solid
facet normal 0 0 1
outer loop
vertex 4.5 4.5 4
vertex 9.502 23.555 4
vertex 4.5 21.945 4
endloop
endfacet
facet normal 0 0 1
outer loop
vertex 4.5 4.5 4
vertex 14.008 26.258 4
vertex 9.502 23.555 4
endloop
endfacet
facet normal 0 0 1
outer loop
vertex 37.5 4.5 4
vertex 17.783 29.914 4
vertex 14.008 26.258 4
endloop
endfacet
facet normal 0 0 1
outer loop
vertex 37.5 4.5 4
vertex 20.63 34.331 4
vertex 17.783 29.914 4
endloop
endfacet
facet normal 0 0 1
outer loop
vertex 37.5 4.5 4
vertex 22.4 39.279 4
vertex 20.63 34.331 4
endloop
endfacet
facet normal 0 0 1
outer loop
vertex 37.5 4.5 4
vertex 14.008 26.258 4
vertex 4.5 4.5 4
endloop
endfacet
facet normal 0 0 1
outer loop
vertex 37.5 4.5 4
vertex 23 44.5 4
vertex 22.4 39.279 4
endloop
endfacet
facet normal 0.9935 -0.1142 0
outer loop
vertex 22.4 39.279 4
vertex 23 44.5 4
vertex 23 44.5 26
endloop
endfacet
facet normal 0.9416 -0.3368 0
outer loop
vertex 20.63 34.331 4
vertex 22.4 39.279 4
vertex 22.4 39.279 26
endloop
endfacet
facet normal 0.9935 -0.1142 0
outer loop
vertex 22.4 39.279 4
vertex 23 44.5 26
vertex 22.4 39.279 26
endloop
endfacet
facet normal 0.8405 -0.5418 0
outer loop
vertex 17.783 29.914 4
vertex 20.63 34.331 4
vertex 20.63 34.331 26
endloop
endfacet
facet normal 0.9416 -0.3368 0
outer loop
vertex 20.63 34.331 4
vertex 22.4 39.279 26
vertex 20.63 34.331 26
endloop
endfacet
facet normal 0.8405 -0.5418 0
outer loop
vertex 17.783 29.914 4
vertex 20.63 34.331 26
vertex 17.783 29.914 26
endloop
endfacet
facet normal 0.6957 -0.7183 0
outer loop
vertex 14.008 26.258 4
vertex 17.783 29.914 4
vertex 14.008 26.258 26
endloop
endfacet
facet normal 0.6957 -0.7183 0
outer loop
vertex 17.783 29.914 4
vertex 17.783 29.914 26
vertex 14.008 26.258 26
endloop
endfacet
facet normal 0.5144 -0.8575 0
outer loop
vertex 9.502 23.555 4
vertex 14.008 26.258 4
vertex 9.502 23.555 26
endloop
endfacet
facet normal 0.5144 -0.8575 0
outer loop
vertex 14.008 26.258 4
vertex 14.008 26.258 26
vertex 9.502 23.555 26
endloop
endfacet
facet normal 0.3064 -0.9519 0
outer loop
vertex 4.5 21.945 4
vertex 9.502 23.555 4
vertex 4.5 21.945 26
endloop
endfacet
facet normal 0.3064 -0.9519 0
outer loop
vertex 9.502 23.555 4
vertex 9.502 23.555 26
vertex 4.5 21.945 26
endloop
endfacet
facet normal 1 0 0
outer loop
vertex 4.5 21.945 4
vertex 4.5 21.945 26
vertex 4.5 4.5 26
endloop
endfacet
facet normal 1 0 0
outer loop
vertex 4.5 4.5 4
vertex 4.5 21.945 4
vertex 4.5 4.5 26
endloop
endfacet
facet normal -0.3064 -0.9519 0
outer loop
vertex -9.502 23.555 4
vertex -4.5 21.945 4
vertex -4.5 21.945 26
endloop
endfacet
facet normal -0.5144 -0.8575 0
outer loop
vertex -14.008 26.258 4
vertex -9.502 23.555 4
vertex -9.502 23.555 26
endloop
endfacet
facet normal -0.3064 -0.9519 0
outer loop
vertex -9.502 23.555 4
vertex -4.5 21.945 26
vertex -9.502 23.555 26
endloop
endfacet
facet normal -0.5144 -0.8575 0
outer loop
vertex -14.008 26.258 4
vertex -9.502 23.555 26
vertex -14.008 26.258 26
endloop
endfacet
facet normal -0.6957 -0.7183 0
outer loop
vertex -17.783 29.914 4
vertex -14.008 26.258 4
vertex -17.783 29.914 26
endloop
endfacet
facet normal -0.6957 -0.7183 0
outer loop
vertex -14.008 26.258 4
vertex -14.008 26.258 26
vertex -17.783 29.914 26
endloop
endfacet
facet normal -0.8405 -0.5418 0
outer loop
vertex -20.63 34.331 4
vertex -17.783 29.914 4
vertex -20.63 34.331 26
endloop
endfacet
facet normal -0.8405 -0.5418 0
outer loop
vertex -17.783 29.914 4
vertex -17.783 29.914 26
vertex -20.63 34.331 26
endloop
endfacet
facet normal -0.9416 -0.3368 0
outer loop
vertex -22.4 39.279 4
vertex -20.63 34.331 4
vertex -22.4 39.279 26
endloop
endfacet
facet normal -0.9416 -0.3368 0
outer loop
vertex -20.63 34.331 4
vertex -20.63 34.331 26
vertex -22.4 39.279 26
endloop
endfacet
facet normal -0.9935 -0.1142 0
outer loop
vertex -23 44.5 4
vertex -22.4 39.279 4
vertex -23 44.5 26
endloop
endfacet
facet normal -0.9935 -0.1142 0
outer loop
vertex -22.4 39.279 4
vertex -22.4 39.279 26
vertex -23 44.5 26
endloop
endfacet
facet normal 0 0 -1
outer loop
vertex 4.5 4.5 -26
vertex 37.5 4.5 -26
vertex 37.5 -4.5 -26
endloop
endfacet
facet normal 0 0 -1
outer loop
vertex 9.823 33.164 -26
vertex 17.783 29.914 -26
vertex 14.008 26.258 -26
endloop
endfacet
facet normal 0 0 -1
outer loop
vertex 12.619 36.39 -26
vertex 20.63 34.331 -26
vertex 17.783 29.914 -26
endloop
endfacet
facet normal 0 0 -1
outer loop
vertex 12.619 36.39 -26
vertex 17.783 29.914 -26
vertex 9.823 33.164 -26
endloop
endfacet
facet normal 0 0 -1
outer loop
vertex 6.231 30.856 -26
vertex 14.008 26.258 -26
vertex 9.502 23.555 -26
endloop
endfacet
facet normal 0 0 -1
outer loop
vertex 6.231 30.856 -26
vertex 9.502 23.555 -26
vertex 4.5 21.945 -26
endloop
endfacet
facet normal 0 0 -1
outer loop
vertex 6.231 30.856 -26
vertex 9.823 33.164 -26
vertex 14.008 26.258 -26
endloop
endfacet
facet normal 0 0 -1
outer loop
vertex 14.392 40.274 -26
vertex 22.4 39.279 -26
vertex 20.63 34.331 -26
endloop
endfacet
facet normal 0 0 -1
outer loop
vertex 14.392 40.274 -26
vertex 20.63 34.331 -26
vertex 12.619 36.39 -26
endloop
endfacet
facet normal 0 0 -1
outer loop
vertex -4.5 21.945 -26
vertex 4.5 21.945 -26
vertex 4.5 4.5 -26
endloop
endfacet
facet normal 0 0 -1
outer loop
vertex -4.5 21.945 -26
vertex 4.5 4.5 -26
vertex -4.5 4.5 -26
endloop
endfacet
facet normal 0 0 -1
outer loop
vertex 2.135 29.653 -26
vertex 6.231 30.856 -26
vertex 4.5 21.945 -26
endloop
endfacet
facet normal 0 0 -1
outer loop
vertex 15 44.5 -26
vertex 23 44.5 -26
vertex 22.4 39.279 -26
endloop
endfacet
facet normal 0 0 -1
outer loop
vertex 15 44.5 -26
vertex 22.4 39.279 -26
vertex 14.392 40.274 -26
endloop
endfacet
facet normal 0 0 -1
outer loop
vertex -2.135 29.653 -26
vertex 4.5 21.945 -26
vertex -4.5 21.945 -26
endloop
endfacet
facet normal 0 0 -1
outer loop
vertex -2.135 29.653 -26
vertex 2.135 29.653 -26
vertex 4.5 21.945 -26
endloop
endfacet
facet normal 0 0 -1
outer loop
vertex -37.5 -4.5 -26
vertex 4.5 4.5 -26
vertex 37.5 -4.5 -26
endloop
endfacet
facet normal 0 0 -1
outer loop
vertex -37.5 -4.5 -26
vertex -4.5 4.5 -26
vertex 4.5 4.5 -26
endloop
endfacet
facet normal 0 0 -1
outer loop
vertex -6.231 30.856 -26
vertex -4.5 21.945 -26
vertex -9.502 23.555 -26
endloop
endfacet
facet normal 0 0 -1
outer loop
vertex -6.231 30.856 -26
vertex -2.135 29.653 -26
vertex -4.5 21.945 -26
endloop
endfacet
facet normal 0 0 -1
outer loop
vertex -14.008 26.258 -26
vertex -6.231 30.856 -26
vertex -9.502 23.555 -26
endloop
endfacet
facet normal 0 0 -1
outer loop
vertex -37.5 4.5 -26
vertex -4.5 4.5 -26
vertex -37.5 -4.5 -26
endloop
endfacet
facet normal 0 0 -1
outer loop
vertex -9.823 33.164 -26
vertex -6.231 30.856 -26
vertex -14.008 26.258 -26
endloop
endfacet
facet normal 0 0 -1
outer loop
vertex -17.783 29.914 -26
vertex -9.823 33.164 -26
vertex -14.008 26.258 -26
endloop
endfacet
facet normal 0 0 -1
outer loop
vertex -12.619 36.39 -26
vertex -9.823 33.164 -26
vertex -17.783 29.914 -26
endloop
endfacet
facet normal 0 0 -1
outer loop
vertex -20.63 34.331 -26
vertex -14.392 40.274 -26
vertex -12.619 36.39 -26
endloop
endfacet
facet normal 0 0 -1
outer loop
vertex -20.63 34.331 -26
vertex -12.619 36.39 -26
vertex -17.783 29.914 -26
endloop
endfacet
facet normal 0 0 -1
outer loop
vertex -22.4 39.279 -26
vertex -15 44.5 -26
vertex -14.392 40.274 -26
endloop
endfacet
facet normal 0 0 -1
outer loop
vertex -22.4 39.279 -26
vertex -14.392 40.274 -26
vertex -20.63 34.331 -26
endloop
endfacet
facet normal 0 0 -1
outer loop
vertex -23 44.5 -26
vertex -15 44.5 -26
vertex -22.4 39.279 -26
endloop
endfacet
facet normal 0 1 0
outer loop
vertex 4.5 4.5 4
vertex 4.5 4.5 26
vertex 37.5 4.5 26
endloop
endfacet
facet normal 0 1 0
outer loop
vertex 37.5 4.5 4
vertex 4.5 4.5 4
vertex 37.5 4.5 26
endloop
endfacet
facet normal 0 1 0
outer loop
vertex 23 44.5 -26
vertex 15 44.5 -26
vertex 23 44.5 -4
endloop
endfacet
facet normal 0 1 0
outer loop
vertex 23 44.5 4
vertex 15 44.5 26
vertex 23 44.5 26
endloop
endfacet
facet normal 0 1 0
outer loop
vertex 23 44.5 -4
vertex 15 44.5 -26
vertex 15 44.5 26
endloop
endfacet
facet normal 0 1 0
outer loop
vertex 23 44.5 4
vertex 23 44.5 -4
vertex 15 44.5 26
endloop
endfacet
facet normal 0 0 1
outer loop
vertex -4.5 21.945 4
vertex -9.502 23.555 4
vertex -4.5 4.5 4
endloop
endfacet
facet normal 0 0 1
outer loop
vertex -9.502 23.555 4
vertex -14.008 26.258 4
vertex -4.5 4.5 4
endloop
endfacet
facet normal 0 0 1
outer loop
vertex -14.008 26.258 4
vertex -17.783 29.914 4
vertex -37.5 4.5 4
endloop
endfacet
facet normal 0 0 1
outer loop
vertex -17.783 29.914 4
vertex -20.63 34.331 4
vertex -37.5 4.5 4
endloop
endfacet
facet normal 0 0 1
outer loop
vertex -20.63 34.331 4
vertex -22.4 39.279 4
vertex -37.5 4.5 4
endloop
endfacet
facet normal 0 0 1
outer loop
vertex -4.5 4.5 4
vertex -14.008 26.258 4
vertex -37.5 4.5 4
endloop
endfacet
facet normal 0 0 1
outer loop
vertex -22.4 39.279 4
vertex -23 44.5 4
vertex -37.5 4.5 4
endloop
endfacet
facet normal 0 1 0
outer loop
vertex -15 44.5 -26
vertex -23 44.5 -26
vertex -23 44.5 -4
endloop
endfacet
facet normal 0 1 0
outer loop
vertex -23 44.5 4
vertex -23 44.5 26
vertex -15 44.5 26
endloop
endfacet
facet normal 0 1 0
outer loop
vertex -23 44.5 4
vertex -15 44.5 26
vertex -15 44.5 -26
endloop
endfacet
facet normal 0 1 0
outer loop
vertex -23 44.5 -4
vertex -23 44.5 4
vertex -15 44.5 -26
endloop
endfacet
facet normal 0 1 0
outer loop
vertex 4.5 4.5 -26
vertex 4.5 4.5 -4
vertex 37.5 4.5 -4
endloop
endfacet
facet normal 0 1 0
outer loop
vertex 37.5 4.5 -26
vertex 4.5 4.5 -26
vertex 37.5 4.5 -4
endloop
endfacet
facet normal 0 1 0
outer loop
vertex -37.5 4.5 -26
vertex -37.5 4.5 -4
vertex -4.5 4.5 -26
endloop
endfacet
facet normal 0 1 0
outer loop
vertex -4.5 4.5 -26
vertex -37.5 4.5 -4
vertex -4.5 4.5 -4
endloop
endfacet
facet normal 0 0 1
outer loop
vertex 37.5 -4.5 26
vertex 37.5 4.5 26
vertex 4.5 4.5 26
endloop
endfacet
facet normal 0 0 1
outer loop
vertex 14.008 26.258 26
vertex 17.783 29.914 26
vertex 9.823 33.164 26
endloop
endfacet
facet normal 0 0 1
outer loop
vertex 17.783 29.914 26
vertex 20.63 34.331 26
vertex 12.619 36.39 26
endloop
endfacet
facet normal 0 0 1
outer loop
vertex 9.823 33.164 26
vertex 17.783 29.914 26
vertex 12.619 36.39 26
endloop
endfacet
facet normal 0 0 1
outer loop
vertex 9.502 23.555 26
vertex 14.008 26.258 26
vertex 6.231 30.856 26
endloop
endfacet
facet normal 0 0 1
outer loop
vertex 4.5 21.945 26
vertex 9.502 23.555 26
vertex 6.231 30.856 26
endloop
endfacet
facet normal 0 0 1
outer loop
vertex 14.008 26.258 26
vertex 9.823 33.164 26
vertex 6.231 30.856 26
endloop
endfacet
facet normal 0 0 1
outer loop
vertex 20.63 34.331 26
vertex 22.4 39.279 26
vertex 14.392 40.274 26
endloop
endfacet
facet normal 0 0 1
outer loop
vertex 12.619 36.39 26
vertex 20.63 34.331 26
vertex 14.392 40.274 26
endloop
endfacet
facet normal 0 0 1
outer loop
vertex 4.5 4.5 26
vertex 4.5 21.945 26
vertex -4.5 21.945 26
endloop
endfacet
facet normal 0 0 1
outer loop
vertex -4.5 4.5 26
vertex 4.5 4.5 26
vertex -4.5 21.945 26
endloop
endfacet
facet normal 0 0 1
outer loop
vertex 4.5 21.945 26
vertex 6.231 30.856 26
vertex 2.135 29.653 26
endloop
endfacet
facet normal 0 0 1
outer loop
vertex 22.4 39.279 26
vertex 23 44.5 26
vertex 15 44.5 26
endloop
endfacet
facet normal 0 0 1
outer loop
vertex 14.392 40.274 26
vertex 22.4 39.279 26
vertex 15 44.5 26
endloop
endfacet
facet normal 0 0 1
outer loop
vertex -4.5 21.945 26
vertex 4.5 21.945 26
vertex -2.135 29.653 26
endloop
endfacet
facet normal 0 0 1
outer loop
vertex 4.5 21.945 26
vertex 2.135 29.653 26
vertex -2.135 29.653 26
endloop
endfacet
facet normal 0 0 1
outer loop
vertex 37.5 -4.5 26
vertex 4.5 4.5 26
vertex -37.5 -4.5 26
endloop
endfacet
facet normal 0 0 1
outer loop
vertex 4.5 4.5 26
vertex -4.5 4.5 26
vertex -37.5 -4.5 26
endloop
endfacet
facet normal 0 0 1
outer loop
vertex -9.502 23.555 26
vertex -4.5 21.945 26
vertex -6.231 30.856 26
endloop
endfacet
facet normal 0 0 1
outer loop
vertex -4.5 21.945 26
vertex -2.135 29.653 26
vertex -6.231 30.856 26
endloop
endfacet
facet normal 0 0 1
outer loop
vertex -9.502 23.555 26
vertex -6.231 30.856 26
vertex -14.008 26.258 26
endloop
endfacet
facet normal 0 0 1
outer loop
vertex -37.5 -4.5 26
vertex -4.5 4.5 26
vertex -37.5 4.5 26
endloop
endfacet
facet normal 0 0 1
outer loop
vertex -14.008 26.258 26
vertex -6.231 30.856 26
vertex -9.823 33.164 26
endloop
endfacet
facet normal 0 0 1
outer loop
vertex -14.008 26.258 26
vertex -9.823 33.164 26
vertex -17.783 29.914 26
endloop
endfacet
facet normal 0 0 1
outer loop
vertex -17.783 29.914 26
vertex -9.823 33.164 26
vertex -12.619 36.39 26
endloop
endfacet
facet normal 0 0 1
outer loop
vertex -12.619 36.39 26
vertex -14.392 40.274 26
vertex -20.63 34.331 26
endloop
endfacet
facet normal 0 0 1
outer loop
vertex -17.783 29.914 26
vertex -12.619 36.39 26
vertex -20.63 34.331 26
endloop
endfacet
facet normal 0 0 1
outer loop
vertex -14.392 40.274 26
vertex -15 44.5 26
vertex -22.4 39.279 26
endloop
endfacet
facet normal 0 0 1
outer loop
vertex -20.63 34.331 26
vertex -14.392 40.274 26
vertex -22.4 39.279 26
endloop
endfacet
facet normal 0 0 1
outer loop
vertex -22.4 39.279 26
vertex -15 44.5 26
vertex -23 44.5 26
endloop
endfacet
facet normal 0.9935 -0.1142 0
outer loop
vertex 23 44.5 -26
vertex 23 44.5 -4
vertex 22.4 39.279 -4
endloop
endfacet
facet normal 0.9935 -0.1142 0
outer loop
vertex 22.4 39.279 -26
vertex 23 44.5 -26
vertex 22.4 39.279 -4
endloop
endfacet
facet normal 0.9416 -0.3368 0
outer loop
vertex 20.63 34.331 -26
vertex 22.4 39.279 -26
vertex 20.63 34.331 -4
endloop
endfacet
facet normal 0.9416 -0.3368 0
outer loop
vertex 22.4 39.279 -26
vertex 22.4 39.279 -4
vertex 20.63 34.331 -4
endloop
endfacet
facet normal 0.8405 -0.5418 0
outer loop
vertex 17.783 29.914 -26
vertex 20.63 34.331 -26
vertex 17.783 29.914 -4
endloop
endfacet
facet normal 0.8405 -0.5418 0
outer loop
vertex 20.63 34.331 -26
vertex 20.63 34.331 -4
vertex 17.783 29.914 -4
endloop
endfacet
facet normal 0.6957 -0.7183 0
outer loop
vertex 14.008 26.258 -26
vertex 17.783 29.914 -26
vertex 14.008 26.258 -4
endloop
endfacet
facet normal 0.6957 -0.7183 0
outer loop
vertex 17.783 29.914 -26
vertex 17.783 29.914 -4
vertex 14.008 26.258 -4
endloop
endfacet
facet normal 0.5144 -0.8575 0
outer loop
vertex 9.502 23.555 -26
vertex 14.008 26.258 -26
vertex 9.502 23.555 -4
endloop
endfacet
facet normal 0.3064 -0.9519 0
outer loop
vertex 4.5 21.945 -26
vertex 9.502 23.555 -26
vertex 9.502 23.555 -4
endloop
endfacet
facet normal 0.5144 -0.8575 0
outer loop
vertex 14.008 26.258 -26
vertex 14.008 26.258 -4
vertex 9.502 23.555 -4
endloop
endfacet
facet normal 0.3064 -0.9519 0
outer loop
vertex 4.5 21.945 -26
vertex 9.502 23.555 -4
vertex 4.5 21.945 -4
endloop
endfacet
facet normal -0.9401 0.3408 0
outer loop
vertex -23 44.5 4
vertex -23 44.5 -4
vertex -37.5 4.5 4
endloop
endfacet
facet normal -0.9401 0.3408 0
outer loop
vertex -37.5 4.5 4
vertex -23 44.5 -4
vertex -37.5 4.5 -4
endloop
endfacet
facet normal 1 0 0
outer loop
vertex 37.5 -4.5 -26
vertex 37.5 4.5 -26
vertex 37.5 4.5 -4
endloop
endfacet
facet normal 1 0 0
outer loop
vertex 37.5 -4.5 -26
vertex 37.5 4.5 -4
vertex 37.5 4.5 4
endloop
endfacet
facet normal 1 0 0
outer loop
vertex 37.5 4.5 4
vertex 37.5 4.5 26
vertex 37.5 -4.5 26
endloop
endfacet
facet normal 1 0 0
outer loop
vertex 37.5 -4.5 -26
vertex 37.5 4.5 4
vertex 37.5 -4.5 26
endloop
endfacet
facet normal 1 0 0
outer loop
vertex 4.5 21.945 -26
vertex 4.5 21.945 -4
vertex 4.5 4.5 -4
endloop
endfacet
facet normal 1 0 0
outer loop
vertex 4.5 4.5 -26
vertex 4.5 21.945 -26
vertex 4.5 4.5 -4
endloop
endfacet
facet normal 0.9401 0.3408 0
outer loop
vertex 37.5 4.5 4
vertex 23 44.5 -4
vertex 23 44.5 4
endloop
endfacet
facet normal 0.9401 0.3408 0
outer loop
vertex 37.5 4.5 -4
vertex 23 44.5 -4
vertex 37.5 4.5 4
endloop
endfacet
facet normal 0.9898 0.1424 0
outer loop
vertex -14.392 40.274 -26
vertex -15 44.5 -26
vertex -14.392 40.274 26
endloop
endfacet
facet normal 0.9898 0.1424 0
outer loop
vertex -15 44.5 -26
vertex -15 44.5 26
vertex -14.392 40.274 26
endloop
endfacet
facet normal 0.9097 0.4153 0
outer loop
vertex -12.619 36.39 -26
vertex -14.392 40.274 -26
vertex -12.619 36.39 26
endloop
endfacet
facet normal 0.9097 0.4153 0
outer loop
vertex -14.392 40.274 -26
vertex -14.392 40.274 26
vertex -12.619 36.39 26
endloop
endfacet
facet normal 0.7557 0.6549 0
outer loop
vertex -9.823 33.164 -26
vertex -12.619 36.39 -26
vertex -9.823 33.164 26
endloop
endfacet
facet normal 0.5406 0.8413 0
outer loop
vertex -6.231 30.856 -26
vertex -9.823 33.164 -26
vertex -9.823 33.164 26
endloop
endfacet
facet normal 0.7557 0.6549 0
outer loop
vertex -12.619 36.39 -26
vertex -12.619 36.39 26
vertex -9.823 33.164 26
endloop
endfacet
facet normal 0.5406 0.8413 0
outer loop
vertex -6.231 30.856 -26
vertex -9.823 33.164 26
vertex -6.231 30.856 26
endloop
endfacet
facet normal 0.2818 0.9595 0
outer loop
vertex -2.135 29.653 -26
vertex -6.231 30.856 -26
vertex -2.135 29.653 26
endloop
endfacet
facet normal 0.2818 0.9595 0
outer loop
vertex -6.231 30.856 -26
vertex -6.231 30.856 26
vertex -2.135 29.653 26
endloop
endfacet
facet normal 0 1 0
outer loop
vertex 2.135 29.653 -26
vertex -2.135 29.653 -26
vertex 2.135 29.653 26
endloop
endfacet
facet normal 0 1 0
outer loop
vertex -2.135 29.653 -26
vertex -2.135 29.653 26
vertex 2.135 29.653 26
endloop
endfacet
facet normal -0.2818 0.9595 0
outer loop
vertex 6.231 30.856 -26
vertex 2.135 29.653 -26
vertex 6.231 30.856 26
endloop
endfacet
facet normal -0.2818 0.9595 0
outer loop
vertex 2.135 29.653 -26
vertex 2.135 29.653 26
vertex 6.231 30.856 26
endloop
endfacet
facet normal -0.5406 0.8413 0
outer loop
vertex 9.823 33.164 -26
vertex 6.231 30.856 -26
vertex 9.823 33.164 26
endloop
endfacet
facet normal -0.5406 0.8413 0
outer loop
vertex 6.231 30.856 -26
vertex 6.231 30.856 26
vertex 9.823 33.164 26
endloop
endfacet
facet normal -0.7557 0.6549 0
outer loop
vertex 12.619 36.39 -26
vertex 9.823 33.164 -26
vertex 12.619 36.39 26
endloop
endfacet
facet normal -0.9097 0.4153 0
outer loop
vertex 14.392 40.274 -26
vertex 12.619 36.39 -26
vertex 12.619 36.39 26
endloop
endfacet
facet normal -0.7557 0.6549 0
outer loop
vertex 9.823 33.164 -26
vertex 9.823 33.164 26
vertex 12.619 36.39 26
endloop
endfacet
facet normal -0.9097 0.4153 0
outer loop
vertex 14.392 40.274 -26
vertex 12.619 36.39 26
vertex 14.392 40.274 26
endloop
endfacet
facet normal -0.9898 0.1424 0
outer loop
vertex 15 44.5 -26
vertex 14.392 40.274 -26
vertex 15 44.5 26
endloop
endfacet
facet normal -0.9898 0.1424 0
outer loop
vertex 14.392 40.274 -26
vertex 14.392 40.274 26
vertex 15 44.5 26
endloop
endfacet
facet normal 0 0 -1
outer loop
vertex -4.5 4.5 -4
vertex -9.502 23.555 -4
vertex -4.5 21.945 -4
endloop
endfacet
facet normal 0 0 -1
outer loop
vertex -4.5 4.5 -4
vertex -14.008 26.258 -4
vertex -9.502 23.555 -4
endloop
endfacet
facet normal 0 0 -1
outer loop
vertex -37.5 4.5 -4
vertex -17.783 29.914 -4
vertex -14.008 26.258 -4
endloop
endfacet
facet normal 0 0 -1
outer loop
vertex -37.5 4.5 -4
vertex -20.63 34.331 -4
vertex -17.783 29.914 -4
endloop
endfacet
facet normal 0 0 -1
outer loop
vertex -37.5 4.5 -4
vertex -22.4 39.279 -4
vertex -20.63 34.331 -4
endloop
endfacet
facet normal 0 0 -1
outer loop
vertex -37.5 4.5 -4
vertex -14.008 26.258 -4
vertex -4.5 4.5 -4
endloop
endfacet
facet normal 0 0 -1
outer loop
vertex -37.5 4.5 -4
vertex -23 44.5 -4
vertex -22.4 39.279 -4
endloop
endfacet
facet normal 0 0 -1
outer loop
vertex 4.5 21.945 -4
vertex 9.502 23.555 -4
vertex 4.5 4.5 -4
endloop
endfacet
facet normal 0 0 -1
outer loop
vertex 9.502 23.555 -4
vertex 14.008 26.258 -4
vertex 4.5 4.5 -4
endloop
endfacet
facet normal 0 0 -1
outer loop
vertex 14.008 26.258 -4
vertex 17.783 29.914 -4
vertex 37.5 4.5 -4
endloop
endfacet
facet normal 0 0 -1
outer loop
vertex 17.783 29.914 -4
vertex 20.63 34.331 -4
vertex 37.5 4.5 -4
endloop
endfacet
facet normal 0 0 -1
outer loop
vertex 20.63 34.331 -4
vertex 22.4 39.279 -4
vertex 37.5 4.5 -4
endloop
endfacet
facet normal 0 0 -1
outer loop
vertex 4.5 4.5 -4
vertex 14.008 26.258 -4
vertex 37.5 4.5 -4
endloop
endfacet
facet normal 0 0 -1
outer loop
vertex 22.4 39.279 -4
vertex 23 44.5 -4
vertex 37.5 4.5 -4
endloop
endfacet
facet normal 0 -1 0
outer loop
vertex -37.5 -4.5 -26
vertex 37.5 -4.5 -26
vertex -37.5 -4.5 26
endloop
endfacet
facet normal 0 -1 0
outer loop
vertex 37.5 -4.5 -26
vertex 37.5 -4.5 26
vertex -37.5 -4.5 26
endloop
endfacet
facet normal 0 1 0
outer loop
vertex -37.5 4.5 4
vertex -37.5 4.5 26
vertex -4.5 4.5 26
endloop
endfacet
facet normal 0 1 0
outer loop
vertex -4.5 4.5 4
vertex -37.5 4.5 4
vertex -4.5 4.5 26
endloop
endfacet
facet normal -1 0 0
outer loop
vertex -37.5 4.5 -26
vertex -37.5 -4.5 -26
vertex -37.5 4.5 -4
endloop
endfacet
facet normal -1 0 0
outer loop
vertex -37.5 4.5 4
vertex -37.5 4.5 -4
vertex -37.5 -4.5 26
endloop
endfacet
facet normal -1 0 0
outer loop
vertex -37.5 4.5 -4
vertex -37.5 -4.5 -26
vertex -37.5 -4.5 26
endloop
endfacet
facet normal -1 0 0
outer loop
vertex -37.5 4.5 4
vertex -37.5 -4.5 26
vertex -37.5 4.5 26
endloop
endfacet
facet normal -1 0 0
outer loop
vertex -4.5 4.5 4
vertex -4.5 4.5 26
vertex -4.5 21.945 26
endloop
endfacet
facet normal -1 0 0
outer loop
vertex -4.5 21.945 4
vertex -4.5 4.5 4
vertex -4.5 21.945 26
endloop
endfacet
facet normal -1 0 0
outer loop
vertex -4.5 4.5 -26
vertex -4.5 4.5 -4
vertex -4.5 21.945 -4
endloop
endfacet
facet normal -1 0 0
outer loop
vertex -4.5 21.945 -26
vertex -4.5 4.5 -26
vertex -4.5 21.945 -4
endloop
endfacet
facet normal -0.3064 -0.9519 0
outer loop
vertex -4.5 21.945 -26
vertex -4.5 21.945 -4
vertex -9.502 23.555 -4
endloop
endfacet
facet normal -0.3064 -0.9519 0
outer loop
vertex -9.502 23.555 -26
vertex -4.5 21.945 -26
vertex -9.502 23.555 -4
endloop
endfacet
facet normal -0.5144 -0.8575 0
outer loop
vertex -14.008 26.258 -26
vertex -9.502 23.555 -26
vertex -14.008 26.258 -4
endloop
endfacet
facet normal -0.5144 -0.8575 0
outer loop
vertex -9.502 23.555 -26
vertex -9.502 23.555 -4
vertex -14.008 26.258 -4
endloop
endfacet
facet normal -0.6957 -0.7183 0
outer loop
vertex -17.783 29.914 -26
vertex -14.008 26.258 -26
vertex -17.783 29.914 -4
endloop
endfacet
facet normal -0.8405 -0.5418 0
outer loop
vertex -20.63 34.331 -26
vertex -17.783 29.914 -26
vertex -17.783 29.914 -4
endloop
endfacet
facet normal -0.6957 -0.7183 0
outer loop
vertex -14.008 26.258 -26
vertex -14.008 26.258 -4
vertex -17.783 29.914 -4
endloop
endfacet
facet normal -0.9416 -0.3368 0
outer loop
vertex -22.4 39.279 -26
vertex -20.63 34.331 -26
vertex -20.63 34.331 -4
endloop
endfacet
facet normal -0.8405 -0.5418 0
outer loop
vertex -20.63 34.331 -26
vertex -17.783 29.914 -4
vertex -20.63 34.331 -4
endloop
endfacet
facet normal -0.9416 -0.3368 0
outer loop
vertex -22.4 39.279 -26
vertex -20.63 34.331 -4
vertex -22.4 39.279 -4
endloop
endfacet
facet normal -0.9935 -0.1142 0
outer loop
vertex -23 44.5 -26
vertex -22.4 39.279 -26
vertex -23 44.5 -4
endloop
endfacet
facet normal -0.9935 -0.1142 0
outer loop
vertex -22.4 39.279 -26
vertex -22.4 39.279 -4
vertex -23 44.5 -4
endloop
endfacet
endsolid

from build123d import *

# Parameters (mm, degrees)
BOSS_EXTRUDE1_DEPTH = 26
RIB1_REACH          = 65.738
SKETCH3_WALL_W      = 172.022520638
SKETCH3_WALL_H      = 8


with BuildPart() as part:
    # Sketch2 → Boss-Extrude1 (new, symmetric)
    with BuildSketch(Plane.XY):
        with BuildLine():
            Line((-23, 44.5), (-15, 44.5))
            ThreePointArc((-15, 44.5), (0, 29.5), (15, 44.5))
            Line((15, 44.5), (23, 44.5))
            ThreePointArc((23, 44.5), (17.783419244, 29.914047854), (4.5, 21.944512863))
            Line((4.5, 21.944512863), (4.5, 4.5))
            Line((4.5, 4.5), (37.5, 4.5))
            Line((37.5, 4.5), (37.5, -4.5))
            Line((37.5, -4.5), (-37.5, -4.5))
            Line((-37.5, -4.5), (-37.5, 4.5))
            Line((-37.5, 4.5), (-4.5, 4.5))
            Line((-4.5, 4.5), (-4.5, 21.944512863))
            ThreePointArc((-4.5, 21.944512863), (-17.783419244, 29.914047854), (-23, 44.5))
        make_face()
    extrude(amount=BOSS_EXTRUDE1_DEPTH, both=True)

    # Sketch3 wall → Rib1 (add, up to next)
    with BuildSketch(Plane(origin=(30.25, 24.5, 0), x_dir=(0.340799323621, -0.940136065162, 0), z_dir=(0.940136065162, 0.340799323621, 0)), mode=Mode.PRIVATE) as rib1_sk1:
        Rectangle(SKETCH3_WALL_W, SKETCH3_WALL_H)
    rib1_tool1 = extrude(rib1_sk1.sketch, amount=-RIB1_REACH, mode=Mode.PRIVATE) - part.part
    rib1 = rib1_tool1.solids().sort_by_distance((30.25, 24.5, 0))[0]
    add(rib1)

    # Mirror1: Rib1 across plane
    add(rib1.mirror(Plane(origin=(0, 0, 0), x_dir=(0, 0, 1), z_dir=(1, 0, 0))))


solid = part.part
